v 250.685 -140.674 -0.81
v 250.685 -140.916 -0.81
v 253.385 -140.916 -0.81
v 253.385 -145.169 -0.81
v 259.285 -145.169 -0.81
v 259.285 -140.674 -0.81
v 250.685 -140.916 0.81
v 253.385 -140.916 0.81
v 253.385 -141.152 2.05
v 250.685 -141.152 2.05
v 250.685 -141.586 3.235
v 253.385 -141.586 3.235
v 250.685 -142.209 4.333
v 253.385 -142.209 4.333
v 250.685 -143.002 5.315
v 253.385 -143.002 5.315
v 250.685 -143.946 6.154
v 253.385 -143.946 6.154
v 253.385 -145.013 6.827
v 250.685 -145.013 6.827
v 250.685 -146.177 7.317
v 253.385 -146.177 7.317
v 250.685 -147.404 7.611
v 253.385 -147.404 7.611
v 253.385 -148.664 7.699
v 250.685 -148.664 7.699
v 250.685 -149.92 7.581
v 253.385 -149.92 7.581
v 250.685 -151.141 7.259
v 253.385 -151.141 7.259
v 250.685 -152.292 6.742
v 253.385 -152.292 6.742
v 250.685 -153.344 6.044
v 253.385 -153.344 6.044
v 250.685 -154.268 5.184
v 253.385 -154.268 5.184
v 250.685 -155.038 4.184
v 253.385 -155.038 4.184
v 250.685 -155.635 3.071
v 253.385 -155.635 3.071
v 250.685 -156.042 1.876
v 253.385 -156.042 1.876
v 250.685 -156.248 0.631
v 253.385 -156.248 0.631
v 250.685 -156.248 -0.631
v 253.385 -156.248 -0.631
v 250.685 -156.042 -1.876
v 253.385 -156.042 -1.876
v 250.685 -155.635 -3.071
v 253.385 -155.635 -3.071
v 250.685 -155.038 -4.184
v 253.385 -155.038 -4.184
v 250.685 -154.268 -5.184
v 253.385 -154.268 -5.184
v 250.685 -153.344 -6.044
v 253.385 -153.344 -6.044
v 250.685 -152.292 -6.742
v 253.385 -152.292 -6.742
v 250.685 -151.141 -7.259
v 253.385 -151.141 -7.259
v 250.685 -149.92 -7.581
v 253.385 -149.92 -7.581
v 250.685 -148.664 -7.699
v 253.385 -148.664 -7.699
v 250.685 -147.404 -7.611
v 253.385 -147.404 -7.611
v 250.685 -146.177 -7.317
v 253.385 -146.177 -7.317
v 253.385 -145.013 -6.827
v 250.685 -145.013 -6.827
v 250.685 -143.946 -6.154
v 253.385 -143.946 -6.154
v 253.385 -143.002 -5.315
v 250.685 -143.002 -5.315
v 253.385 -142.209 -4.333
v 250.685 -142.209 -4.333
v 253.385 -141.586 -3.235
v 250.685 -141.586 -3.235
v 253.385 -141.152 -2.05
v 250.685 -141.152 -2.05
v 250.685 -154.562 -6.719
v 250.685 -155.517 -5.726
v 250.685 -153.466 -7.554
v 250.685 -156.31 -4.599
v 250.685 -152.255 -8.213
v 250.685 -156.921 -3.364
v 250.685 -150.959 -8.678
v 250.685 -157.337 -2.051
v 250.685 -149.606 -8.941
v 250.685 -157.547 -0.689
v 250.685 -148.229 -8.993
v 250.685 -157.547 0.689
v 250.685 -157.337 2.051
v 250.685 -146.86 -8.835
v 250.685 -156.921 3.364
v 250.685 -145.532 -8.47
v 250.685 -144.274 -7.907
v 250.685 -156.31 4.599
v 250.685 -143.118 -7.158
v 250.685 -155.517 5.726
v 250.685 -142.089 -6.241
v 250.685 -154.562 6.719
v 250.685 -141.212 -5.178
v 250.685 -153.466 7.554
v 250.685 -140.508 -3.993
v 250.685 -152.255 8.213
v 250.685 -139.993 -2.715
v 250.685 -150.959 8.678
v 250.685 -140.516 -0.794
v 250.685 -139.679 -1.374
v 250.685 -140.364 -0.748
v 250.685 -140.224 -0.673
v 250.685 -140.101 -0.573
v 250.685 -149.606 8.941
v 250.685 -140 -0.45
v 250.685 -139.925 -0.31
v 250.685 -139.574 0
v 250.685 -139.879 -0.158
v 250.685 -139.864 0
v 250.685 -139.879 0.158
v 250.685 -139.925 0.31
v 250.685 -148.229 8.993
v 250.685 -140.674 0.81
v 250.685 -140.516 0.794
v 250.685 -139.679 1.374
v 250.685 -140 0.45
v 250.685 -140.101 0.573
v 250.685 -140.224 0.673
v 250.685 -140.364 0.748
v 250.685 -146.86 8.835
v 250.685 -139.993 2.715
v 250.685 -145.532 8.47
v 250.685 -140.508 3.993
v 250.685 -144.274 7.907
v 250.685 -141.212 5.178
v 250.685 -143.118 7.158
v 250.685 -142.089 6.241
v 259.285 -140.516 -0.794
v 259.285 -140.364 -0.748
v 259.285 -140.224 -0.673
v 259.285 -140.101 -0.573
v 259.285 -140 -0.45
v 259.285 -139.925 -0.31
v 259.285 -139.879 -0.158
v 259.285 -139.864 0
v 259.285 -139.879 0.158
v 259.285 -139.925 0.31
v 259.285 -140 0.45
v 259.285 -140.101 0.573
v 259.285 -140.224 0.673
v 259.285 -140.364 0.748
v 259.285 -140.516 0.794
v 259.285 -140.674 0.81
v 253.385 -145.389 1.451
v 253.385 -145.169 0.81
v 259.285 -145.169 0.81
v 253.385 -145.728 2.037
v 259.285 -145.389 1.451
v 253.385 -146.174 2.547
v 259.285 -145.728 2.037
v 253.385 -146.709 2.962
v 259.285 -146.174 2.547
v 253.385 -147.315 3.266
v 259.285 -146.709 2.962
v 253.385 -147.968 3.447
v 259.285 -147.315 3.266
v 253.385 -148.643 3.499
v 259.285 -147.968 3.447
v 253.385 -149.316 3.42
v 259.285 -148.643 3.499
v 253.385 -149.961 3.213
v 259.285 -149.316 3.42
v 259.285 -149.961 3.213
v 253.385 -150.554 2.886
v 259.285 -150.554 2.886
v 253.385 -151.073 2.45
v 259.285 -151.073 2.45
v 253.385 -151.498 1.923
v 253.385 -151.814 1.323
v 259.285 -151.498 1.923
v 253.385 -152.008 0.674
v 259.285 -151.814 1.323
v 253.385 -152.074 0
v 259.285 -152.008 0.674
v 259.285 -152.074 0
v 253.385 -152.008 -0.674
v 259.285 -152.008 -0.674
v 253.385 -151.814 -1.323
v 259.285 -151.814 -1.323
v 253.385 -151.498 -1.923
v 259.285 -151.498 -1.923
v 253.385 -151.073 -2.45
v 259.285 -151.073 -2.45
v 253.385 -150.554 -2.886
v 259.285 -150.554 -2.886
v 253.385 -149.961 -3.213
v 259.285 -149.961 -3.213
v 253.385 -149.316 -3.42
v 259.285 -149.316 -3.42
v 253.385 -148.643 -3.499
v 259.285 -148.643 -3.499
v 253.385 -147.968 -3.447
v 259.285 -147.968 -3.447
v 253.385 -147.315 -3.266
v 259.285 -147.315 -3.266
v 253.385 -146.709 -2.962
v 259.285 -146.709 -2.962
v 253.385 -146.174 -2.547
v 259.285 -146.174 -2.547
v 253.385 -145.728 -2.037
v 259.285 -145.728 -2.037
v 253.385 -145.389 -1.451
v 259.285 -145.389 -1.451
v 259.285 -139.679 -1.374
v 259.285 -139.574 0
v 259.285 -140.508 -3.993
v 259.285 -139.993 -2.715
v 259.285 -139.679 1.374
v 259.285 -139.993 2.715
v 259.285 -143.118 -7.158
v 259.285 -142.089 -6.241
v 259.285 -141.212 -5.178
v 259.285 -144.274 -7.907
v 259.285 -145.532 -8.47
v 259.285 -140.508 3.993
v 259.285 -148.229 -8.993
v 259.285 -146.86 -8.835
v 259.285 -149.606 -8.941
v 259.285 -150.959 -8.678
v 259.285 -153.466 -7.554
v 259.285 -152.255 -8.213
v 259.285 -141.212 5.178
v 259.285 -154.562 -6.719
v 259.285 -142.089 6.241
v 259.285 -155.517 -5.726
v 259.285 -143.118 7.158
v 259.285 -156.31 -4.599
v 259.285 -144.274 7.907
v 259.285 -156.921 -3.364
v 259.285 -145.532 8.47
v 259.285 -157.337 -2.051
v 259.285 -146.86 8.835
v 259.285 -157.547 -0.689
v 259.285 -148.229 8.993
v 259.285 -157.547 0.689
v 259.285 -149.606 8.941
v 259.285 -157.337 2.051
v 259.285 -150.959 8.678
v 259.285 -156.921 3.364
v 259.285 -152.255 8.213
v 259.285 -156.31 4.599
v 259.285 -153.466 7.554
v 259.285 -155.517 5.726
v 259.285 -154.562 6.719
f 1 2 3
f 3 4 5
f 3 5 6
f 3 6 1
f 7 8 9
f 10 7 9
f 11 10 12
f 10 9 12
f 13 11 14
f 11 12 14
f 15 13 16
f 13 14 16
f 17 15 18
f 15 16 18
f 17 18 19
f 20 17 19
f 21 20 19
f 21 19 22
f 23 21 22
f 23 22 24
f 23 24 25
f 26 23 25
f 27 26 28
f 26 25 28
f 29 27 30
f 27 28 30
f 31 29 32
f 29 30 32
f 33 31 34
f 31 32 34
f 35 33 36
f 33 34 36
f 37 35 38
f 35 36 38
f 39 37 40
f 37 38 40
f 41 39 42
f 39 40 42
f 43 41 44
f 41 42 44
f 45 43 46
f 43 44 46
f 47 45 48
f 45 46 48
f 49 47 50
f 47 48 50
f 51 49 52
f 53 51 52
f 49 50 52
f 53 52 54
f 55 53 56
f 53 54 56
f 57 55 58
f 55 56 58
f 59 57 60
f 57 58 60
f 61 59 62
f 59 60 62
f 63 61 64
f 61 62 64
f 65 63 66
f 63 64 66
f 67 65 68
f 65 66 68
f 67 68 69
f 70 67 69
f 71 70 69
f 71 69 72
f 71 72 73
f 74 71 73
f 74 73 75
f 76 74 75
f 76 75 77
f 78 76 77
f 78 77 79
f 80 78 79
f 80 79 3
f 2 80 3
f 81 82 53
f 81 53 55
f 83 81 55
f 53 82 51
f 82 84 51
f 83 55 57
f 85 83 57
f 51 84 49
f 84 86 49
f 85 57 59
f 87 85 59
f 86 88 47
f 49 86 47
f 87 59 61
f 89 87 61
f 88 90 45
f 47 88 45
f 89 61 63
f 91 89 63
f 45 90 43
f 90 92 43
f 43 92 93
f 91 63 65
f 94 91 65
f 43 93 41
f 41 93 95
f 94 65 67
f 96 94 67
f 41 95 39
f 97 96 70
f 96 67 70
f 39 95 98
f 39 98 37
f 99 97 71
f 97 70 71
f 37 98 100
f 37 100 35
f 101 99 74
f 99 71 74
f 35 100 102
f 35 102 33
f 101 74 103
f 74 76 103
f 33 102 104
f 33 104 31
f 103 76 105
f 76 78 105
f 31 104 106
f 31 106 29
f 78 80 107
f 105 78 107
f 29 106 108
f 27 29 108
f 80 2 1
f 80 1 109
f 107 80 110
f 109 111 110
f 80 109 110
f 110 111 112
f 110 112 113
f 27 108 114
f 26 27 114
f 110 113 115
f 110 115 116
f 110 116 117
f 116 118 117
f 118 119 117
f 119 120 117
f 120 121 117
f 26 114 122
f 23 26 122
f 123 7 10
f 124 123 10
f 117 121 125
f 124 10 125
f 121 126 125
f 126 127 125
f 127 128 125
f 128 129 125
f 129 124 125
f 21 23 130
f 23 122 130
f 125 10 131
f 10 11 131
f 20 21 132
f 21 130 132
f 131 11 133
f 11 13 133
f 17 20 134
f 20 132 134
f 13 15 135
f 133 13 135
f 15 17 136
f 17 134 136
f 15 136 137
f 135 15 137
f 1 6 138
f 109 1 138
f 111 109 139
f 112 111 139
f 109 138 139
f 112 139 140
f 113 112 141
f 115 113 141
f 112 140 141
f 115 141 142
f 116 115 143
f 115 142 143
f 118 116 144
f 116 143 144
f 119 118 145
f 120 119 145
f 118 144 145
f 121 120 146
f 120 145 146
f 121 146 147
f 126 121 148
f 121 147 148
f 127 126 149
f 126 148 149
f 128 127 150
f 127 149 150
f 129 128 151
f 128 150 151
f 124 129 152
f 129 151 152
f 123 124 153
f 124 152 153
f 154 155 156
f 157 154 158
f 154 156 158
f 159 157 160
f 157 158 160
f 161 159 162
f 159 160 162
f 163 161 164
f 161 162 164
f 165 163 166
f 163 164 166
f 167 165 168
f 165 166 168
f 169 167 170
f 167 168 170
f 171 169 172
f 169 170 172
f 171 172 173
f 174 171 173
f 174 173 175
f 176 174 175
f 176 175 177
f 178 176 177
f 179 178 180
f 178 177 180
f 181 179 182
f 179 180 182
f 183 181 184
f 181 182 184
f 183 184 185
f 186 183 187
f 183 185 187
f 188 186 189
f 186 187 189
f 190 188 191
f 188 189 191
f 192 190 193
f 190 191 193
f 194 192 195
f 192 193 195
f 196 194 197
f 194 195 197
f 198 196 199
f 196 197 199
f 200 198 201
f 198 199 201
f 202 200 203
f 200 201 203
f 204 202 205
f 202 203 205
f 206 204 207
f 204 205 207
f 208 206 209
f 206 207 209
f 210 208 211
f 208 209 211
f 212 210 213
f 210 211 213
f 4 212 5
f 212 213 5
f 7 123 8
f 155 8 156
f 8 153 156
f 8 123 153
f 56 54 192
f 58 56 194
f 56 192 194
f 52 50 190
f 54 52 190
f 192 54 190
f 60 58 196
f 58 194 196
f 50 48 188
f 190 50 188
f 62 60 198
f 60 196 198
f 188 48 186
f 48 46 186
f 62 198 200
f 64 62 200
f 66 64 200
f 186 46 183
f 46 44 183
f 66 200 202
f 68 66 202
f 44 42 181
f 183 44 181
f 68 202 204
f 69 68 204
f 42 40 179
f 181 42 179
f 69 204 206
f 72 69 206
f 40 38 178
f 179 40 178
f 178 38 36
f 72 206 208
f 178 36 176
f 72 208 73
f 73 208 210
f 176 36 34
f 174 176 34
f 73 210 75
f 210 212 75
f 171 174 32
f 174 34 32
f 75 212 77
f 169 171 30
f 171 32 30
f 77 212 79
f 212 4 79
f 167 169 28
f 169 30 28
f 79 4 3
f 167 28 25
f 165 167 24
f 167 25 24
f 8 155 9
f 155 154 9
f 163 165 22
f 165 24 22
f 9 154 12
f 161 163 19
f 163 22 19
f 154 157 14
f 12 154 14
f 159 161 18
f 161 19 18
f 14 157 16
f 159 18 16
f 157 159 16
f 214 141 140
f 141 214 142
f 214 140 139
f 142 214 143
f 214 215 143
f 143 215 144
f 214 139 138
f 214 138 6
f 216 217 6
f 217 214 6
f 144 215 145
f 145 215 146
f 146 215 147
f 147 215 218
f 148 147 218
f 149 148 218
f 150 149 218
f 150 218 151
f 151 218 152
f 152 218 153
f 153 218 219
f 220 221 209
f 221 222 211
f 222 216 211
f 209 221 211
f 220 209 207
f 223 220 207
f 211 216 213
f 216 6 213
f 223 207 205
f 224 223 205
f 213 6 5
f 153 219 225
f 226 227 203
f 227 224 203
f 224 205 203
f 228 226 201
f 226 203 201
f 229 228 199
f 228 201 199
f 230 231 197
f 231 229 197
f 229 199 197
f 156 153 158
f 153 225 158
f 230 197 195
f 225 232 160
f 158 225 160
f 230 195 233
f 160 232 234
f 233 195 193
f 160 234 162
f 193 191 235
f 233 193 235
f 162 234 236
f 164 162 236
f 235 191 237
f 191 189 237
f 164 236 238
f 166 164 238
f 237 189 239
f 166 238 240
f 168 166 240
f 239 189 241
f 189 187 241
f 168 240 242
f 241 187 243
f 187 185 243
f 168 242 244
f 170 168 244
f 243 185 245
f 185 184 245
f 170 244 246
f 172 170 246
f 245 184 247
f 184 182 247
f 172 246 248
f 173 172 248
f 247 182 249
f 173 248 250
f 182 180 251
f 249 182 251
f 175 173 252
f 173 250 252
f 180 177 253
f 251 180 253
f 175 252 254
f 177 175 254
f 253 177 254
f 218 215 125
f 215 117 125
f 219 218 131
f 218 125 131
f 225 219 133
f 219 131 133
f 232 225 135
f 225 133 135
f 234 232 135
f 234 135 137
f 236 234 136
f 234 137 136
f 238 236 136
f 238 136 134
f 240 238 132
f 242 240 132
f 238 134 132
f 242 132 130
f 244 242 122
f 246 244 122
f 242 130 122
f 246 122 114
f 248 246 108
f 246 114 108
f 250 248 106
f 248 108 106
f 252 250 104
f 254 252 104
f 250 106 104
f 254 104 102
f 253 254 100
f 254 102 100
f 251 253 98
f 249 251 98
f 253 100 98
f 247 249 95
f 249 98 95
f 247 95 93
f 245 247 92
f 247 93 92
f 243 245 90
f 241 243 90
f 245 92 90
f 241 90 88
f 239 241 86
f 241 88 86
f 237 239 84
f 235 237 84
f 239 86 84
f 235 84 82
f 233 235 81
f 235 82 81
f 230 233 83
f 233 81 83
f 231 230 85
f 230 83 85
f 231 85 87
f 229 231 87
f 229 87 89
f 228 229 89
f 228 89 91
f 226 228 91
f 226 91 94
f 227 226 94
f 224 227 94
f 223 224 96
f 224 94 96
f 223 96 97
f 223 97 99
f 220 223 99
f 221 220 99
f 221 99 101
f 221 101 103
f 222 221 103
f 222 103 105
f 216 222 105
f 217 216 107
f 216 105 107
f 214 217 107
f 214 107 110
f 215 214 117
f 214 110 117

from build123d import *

# Parameters (mm, degrees)
CUT_EXTRUDE1_REACH = 10.6


with BuildPart() as part:
    # Sketch3 → Revolve1 (revolve)
    with BuildSketch(Plane.XY):
        Polygon((253.385153788, -140.873704322), (253.385153788, -145.073704322), (259.285153788, -145.073704322), (259.285153788, -140.857236748), (259.285153788, -139.573704322), (250.685153788, -139.573704322), (250.685153788, -140.873704322), align=None)
    revolve(axis=Axis((227.370475166, -148.573704322, 0), (1, 0, 0)))

    # Sketch11 → Cut-Extrude1 (cut, up to next)
    with BuildSketch(Plane(origin=(259.285153788, 0, 0), x_dir=(0, 0, -1), z_dir=(1, 0, 0)), mode=Mode.PRIVATE) as cut_extrude1_sk1:
        with BuildLine():
            Line((-0.810006034, -140.673704322), (-0.810006034, -145.168724113))
            Line((-0.810006034, -145.168724113), (0.810006034, -145.168724113))
            Line((0.810006034, -145.168724113), (0.810006034, -140.673704322))
            ThreePointArc((0.810006034, -140.673704322), (0, -139.863698288), (-0.810006034, -140.673704322))
        make_face()
    cut_extrude1_tool1 = extrude(cut_extrude1_sk1.sketch, amount=-CUT_EXTRUDE1_REACH, mode=Mode.PRIVATE) & part.part
    add(cut_extrude1_tool1.solids().sort_by_distance((259.285154, -142.599941, 0))[0], mode=Mode.SUBTRACT)


solid = part.part
